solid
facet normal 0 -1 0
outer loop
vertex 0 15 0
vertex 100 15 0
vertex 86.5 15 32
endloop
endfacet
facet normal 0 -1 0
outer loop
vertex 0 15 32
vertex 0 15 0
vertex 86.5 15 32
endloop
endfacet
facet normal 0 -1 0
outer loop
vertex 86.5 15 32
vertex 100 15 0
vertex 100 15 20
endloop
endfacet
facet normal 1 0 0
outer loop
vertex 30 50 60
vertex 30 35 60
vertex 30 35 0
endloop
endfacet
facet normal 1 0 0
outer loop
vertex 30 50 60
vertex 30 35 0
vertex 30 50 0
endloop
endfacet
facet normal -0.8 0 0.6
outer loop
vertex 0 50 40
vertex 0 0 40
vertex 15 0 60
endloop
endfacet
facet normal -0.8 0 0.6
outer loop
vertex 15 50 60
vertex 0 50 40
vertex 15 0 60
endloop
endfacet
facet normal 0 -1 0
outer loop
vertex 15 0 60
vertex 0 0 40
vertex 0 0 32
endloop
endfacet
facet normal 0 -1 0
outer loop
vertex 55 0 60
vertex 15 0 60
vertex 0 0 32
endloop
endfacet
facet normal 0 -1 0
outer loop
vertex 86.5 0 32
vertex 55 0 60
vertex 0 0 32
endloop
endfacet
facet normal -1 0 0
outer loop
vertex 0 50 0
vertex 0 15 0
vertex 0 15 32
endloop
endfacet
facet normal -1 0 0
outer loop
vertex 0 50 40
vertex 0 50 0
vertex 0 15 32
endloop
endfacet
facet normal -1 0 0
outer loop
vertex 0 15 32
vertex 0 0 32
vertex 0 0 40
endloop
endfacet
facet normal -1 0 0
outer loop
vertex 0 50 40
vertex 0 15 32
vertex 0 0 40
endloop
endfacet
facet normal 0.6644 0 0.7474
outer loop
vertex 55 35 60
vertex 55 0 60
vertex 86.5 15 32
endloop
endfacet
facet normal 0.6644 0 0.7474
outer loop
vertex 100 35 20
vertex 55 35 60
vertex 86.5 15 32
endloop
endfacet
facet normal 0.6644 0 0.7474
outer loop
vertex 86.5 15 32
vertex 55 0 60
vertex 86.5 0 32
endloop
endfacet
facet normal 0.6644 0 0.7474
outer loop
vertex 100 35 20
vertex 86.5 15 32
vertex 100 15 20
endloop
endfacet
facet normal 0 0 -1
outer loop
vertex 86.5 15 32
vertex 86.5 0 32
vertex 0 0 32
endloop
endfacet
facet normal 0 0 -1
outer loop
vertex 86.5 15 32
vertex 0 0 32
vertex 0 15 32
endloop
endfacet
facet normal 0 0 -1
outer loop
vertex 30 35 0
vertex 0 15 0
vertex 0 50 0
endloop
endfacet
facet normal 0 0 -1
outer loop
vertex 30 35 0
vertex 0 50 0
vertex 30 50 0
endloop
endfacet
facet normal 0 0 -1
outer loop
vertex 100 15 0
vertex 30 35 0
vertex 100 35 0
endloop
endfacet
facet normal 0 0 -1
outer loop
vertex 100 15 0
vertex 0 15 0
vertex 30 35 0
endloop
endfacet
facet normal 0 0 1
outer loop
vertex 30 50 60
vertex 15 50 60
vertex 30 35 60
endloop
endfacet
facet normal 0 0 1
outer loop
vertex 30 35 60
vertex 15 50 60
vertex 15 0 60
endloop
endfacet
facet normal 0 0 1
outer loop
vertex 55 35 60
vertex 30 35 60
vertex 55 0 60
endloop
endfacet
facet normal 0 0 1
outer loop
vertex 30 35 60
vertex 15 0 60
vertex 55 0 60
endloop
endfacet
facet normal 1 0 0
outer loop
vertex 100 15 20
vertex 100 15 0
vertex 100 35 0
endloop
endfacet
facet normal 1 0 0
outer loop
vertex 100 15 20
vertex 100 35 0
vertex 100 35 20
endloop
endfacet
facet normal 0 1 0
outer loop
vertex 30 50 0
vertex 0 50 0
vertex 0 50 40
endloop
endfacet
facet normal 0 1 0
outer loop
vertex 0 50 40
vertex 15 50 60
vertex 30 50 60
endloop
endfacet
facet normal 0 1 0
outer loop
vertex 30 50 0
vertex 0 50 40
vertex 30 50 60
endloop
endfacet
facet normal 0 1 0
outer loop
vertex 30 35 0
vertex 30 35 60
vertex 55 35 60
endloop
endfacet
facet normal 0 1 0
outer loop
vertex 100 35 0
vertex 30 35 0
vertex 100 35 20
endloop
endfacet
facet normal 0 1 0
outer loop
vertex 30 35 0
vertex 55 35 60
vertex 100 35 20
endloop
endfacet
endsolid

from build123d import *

# Parameters (mm, degrees)
F0_W      = 100
F0_H      = 60
F1_DEPTH  = 50
F2_W      = 70
F2_H      = 15
F3_DEPTH  = 60
F4_W      = 15
F4_H      = 32
F5_DEPTH  = 100
F7_DEPTH  = 50
F9_DEPTH  = 35
F11_DEPTH = 20


with BuildPart() as f1:
    # F0 (on Front) → F1 (new body)
    with BuildSketch(Plane.XZ):
        with Locations((50, 30)):
            Rectangle(F0_W, F0_H)
    extrude(amount=-F1_DEPTH)

    # F2 (on face) → F3 (cut, through all)
    with BuildSketch(Plane.XY.offset(60)):
        with Locations((65, 42.5)):
            Rectangle(F2_W, F2_H)
    extrude(amount=-F3_DEPTH, mode=Mode.SUBTRACT)

    # F4 (on face) → F5 (cut, through all)
    with BuildSketch(Plane.YZ.offset(100)):
        with Locations((7.5, 16)):
            Rectangle(F4_W, F4_H)
    extrude(amount=-F5_DEPTH, mode=Mode.SUBTRACT)

    # F6 (on face) → F7 (cut, through all)
    with BuildSketch(Plane.XZ):
        Polygon((0, 40), (15, 60), (0, 60), align=None)
    extrude(amount=-F7_DEPTH, mode=Mode.SUBTRACT)

    # F8 (on face) → F9 (cut, through all)
    with BuildSketch(Plane.XZ):
        Polygon((100, 60), (55, 60), (86.5, 32), (100, 32), align=None)
    extrude(amount=-F9_DEPTH, mode=Mode.SUBTRACT)

    # F10 (on face) → F11 (cut, through all)
    with BuildSketch(Plane.XZ.offset(-15)):
        Polygon((100, 32), (86.5, 32), (100, 20), align=None)
    extrude(amount=-F11_DEPTH, mode=Mode.SUBTRACT)


solid = f1.part
